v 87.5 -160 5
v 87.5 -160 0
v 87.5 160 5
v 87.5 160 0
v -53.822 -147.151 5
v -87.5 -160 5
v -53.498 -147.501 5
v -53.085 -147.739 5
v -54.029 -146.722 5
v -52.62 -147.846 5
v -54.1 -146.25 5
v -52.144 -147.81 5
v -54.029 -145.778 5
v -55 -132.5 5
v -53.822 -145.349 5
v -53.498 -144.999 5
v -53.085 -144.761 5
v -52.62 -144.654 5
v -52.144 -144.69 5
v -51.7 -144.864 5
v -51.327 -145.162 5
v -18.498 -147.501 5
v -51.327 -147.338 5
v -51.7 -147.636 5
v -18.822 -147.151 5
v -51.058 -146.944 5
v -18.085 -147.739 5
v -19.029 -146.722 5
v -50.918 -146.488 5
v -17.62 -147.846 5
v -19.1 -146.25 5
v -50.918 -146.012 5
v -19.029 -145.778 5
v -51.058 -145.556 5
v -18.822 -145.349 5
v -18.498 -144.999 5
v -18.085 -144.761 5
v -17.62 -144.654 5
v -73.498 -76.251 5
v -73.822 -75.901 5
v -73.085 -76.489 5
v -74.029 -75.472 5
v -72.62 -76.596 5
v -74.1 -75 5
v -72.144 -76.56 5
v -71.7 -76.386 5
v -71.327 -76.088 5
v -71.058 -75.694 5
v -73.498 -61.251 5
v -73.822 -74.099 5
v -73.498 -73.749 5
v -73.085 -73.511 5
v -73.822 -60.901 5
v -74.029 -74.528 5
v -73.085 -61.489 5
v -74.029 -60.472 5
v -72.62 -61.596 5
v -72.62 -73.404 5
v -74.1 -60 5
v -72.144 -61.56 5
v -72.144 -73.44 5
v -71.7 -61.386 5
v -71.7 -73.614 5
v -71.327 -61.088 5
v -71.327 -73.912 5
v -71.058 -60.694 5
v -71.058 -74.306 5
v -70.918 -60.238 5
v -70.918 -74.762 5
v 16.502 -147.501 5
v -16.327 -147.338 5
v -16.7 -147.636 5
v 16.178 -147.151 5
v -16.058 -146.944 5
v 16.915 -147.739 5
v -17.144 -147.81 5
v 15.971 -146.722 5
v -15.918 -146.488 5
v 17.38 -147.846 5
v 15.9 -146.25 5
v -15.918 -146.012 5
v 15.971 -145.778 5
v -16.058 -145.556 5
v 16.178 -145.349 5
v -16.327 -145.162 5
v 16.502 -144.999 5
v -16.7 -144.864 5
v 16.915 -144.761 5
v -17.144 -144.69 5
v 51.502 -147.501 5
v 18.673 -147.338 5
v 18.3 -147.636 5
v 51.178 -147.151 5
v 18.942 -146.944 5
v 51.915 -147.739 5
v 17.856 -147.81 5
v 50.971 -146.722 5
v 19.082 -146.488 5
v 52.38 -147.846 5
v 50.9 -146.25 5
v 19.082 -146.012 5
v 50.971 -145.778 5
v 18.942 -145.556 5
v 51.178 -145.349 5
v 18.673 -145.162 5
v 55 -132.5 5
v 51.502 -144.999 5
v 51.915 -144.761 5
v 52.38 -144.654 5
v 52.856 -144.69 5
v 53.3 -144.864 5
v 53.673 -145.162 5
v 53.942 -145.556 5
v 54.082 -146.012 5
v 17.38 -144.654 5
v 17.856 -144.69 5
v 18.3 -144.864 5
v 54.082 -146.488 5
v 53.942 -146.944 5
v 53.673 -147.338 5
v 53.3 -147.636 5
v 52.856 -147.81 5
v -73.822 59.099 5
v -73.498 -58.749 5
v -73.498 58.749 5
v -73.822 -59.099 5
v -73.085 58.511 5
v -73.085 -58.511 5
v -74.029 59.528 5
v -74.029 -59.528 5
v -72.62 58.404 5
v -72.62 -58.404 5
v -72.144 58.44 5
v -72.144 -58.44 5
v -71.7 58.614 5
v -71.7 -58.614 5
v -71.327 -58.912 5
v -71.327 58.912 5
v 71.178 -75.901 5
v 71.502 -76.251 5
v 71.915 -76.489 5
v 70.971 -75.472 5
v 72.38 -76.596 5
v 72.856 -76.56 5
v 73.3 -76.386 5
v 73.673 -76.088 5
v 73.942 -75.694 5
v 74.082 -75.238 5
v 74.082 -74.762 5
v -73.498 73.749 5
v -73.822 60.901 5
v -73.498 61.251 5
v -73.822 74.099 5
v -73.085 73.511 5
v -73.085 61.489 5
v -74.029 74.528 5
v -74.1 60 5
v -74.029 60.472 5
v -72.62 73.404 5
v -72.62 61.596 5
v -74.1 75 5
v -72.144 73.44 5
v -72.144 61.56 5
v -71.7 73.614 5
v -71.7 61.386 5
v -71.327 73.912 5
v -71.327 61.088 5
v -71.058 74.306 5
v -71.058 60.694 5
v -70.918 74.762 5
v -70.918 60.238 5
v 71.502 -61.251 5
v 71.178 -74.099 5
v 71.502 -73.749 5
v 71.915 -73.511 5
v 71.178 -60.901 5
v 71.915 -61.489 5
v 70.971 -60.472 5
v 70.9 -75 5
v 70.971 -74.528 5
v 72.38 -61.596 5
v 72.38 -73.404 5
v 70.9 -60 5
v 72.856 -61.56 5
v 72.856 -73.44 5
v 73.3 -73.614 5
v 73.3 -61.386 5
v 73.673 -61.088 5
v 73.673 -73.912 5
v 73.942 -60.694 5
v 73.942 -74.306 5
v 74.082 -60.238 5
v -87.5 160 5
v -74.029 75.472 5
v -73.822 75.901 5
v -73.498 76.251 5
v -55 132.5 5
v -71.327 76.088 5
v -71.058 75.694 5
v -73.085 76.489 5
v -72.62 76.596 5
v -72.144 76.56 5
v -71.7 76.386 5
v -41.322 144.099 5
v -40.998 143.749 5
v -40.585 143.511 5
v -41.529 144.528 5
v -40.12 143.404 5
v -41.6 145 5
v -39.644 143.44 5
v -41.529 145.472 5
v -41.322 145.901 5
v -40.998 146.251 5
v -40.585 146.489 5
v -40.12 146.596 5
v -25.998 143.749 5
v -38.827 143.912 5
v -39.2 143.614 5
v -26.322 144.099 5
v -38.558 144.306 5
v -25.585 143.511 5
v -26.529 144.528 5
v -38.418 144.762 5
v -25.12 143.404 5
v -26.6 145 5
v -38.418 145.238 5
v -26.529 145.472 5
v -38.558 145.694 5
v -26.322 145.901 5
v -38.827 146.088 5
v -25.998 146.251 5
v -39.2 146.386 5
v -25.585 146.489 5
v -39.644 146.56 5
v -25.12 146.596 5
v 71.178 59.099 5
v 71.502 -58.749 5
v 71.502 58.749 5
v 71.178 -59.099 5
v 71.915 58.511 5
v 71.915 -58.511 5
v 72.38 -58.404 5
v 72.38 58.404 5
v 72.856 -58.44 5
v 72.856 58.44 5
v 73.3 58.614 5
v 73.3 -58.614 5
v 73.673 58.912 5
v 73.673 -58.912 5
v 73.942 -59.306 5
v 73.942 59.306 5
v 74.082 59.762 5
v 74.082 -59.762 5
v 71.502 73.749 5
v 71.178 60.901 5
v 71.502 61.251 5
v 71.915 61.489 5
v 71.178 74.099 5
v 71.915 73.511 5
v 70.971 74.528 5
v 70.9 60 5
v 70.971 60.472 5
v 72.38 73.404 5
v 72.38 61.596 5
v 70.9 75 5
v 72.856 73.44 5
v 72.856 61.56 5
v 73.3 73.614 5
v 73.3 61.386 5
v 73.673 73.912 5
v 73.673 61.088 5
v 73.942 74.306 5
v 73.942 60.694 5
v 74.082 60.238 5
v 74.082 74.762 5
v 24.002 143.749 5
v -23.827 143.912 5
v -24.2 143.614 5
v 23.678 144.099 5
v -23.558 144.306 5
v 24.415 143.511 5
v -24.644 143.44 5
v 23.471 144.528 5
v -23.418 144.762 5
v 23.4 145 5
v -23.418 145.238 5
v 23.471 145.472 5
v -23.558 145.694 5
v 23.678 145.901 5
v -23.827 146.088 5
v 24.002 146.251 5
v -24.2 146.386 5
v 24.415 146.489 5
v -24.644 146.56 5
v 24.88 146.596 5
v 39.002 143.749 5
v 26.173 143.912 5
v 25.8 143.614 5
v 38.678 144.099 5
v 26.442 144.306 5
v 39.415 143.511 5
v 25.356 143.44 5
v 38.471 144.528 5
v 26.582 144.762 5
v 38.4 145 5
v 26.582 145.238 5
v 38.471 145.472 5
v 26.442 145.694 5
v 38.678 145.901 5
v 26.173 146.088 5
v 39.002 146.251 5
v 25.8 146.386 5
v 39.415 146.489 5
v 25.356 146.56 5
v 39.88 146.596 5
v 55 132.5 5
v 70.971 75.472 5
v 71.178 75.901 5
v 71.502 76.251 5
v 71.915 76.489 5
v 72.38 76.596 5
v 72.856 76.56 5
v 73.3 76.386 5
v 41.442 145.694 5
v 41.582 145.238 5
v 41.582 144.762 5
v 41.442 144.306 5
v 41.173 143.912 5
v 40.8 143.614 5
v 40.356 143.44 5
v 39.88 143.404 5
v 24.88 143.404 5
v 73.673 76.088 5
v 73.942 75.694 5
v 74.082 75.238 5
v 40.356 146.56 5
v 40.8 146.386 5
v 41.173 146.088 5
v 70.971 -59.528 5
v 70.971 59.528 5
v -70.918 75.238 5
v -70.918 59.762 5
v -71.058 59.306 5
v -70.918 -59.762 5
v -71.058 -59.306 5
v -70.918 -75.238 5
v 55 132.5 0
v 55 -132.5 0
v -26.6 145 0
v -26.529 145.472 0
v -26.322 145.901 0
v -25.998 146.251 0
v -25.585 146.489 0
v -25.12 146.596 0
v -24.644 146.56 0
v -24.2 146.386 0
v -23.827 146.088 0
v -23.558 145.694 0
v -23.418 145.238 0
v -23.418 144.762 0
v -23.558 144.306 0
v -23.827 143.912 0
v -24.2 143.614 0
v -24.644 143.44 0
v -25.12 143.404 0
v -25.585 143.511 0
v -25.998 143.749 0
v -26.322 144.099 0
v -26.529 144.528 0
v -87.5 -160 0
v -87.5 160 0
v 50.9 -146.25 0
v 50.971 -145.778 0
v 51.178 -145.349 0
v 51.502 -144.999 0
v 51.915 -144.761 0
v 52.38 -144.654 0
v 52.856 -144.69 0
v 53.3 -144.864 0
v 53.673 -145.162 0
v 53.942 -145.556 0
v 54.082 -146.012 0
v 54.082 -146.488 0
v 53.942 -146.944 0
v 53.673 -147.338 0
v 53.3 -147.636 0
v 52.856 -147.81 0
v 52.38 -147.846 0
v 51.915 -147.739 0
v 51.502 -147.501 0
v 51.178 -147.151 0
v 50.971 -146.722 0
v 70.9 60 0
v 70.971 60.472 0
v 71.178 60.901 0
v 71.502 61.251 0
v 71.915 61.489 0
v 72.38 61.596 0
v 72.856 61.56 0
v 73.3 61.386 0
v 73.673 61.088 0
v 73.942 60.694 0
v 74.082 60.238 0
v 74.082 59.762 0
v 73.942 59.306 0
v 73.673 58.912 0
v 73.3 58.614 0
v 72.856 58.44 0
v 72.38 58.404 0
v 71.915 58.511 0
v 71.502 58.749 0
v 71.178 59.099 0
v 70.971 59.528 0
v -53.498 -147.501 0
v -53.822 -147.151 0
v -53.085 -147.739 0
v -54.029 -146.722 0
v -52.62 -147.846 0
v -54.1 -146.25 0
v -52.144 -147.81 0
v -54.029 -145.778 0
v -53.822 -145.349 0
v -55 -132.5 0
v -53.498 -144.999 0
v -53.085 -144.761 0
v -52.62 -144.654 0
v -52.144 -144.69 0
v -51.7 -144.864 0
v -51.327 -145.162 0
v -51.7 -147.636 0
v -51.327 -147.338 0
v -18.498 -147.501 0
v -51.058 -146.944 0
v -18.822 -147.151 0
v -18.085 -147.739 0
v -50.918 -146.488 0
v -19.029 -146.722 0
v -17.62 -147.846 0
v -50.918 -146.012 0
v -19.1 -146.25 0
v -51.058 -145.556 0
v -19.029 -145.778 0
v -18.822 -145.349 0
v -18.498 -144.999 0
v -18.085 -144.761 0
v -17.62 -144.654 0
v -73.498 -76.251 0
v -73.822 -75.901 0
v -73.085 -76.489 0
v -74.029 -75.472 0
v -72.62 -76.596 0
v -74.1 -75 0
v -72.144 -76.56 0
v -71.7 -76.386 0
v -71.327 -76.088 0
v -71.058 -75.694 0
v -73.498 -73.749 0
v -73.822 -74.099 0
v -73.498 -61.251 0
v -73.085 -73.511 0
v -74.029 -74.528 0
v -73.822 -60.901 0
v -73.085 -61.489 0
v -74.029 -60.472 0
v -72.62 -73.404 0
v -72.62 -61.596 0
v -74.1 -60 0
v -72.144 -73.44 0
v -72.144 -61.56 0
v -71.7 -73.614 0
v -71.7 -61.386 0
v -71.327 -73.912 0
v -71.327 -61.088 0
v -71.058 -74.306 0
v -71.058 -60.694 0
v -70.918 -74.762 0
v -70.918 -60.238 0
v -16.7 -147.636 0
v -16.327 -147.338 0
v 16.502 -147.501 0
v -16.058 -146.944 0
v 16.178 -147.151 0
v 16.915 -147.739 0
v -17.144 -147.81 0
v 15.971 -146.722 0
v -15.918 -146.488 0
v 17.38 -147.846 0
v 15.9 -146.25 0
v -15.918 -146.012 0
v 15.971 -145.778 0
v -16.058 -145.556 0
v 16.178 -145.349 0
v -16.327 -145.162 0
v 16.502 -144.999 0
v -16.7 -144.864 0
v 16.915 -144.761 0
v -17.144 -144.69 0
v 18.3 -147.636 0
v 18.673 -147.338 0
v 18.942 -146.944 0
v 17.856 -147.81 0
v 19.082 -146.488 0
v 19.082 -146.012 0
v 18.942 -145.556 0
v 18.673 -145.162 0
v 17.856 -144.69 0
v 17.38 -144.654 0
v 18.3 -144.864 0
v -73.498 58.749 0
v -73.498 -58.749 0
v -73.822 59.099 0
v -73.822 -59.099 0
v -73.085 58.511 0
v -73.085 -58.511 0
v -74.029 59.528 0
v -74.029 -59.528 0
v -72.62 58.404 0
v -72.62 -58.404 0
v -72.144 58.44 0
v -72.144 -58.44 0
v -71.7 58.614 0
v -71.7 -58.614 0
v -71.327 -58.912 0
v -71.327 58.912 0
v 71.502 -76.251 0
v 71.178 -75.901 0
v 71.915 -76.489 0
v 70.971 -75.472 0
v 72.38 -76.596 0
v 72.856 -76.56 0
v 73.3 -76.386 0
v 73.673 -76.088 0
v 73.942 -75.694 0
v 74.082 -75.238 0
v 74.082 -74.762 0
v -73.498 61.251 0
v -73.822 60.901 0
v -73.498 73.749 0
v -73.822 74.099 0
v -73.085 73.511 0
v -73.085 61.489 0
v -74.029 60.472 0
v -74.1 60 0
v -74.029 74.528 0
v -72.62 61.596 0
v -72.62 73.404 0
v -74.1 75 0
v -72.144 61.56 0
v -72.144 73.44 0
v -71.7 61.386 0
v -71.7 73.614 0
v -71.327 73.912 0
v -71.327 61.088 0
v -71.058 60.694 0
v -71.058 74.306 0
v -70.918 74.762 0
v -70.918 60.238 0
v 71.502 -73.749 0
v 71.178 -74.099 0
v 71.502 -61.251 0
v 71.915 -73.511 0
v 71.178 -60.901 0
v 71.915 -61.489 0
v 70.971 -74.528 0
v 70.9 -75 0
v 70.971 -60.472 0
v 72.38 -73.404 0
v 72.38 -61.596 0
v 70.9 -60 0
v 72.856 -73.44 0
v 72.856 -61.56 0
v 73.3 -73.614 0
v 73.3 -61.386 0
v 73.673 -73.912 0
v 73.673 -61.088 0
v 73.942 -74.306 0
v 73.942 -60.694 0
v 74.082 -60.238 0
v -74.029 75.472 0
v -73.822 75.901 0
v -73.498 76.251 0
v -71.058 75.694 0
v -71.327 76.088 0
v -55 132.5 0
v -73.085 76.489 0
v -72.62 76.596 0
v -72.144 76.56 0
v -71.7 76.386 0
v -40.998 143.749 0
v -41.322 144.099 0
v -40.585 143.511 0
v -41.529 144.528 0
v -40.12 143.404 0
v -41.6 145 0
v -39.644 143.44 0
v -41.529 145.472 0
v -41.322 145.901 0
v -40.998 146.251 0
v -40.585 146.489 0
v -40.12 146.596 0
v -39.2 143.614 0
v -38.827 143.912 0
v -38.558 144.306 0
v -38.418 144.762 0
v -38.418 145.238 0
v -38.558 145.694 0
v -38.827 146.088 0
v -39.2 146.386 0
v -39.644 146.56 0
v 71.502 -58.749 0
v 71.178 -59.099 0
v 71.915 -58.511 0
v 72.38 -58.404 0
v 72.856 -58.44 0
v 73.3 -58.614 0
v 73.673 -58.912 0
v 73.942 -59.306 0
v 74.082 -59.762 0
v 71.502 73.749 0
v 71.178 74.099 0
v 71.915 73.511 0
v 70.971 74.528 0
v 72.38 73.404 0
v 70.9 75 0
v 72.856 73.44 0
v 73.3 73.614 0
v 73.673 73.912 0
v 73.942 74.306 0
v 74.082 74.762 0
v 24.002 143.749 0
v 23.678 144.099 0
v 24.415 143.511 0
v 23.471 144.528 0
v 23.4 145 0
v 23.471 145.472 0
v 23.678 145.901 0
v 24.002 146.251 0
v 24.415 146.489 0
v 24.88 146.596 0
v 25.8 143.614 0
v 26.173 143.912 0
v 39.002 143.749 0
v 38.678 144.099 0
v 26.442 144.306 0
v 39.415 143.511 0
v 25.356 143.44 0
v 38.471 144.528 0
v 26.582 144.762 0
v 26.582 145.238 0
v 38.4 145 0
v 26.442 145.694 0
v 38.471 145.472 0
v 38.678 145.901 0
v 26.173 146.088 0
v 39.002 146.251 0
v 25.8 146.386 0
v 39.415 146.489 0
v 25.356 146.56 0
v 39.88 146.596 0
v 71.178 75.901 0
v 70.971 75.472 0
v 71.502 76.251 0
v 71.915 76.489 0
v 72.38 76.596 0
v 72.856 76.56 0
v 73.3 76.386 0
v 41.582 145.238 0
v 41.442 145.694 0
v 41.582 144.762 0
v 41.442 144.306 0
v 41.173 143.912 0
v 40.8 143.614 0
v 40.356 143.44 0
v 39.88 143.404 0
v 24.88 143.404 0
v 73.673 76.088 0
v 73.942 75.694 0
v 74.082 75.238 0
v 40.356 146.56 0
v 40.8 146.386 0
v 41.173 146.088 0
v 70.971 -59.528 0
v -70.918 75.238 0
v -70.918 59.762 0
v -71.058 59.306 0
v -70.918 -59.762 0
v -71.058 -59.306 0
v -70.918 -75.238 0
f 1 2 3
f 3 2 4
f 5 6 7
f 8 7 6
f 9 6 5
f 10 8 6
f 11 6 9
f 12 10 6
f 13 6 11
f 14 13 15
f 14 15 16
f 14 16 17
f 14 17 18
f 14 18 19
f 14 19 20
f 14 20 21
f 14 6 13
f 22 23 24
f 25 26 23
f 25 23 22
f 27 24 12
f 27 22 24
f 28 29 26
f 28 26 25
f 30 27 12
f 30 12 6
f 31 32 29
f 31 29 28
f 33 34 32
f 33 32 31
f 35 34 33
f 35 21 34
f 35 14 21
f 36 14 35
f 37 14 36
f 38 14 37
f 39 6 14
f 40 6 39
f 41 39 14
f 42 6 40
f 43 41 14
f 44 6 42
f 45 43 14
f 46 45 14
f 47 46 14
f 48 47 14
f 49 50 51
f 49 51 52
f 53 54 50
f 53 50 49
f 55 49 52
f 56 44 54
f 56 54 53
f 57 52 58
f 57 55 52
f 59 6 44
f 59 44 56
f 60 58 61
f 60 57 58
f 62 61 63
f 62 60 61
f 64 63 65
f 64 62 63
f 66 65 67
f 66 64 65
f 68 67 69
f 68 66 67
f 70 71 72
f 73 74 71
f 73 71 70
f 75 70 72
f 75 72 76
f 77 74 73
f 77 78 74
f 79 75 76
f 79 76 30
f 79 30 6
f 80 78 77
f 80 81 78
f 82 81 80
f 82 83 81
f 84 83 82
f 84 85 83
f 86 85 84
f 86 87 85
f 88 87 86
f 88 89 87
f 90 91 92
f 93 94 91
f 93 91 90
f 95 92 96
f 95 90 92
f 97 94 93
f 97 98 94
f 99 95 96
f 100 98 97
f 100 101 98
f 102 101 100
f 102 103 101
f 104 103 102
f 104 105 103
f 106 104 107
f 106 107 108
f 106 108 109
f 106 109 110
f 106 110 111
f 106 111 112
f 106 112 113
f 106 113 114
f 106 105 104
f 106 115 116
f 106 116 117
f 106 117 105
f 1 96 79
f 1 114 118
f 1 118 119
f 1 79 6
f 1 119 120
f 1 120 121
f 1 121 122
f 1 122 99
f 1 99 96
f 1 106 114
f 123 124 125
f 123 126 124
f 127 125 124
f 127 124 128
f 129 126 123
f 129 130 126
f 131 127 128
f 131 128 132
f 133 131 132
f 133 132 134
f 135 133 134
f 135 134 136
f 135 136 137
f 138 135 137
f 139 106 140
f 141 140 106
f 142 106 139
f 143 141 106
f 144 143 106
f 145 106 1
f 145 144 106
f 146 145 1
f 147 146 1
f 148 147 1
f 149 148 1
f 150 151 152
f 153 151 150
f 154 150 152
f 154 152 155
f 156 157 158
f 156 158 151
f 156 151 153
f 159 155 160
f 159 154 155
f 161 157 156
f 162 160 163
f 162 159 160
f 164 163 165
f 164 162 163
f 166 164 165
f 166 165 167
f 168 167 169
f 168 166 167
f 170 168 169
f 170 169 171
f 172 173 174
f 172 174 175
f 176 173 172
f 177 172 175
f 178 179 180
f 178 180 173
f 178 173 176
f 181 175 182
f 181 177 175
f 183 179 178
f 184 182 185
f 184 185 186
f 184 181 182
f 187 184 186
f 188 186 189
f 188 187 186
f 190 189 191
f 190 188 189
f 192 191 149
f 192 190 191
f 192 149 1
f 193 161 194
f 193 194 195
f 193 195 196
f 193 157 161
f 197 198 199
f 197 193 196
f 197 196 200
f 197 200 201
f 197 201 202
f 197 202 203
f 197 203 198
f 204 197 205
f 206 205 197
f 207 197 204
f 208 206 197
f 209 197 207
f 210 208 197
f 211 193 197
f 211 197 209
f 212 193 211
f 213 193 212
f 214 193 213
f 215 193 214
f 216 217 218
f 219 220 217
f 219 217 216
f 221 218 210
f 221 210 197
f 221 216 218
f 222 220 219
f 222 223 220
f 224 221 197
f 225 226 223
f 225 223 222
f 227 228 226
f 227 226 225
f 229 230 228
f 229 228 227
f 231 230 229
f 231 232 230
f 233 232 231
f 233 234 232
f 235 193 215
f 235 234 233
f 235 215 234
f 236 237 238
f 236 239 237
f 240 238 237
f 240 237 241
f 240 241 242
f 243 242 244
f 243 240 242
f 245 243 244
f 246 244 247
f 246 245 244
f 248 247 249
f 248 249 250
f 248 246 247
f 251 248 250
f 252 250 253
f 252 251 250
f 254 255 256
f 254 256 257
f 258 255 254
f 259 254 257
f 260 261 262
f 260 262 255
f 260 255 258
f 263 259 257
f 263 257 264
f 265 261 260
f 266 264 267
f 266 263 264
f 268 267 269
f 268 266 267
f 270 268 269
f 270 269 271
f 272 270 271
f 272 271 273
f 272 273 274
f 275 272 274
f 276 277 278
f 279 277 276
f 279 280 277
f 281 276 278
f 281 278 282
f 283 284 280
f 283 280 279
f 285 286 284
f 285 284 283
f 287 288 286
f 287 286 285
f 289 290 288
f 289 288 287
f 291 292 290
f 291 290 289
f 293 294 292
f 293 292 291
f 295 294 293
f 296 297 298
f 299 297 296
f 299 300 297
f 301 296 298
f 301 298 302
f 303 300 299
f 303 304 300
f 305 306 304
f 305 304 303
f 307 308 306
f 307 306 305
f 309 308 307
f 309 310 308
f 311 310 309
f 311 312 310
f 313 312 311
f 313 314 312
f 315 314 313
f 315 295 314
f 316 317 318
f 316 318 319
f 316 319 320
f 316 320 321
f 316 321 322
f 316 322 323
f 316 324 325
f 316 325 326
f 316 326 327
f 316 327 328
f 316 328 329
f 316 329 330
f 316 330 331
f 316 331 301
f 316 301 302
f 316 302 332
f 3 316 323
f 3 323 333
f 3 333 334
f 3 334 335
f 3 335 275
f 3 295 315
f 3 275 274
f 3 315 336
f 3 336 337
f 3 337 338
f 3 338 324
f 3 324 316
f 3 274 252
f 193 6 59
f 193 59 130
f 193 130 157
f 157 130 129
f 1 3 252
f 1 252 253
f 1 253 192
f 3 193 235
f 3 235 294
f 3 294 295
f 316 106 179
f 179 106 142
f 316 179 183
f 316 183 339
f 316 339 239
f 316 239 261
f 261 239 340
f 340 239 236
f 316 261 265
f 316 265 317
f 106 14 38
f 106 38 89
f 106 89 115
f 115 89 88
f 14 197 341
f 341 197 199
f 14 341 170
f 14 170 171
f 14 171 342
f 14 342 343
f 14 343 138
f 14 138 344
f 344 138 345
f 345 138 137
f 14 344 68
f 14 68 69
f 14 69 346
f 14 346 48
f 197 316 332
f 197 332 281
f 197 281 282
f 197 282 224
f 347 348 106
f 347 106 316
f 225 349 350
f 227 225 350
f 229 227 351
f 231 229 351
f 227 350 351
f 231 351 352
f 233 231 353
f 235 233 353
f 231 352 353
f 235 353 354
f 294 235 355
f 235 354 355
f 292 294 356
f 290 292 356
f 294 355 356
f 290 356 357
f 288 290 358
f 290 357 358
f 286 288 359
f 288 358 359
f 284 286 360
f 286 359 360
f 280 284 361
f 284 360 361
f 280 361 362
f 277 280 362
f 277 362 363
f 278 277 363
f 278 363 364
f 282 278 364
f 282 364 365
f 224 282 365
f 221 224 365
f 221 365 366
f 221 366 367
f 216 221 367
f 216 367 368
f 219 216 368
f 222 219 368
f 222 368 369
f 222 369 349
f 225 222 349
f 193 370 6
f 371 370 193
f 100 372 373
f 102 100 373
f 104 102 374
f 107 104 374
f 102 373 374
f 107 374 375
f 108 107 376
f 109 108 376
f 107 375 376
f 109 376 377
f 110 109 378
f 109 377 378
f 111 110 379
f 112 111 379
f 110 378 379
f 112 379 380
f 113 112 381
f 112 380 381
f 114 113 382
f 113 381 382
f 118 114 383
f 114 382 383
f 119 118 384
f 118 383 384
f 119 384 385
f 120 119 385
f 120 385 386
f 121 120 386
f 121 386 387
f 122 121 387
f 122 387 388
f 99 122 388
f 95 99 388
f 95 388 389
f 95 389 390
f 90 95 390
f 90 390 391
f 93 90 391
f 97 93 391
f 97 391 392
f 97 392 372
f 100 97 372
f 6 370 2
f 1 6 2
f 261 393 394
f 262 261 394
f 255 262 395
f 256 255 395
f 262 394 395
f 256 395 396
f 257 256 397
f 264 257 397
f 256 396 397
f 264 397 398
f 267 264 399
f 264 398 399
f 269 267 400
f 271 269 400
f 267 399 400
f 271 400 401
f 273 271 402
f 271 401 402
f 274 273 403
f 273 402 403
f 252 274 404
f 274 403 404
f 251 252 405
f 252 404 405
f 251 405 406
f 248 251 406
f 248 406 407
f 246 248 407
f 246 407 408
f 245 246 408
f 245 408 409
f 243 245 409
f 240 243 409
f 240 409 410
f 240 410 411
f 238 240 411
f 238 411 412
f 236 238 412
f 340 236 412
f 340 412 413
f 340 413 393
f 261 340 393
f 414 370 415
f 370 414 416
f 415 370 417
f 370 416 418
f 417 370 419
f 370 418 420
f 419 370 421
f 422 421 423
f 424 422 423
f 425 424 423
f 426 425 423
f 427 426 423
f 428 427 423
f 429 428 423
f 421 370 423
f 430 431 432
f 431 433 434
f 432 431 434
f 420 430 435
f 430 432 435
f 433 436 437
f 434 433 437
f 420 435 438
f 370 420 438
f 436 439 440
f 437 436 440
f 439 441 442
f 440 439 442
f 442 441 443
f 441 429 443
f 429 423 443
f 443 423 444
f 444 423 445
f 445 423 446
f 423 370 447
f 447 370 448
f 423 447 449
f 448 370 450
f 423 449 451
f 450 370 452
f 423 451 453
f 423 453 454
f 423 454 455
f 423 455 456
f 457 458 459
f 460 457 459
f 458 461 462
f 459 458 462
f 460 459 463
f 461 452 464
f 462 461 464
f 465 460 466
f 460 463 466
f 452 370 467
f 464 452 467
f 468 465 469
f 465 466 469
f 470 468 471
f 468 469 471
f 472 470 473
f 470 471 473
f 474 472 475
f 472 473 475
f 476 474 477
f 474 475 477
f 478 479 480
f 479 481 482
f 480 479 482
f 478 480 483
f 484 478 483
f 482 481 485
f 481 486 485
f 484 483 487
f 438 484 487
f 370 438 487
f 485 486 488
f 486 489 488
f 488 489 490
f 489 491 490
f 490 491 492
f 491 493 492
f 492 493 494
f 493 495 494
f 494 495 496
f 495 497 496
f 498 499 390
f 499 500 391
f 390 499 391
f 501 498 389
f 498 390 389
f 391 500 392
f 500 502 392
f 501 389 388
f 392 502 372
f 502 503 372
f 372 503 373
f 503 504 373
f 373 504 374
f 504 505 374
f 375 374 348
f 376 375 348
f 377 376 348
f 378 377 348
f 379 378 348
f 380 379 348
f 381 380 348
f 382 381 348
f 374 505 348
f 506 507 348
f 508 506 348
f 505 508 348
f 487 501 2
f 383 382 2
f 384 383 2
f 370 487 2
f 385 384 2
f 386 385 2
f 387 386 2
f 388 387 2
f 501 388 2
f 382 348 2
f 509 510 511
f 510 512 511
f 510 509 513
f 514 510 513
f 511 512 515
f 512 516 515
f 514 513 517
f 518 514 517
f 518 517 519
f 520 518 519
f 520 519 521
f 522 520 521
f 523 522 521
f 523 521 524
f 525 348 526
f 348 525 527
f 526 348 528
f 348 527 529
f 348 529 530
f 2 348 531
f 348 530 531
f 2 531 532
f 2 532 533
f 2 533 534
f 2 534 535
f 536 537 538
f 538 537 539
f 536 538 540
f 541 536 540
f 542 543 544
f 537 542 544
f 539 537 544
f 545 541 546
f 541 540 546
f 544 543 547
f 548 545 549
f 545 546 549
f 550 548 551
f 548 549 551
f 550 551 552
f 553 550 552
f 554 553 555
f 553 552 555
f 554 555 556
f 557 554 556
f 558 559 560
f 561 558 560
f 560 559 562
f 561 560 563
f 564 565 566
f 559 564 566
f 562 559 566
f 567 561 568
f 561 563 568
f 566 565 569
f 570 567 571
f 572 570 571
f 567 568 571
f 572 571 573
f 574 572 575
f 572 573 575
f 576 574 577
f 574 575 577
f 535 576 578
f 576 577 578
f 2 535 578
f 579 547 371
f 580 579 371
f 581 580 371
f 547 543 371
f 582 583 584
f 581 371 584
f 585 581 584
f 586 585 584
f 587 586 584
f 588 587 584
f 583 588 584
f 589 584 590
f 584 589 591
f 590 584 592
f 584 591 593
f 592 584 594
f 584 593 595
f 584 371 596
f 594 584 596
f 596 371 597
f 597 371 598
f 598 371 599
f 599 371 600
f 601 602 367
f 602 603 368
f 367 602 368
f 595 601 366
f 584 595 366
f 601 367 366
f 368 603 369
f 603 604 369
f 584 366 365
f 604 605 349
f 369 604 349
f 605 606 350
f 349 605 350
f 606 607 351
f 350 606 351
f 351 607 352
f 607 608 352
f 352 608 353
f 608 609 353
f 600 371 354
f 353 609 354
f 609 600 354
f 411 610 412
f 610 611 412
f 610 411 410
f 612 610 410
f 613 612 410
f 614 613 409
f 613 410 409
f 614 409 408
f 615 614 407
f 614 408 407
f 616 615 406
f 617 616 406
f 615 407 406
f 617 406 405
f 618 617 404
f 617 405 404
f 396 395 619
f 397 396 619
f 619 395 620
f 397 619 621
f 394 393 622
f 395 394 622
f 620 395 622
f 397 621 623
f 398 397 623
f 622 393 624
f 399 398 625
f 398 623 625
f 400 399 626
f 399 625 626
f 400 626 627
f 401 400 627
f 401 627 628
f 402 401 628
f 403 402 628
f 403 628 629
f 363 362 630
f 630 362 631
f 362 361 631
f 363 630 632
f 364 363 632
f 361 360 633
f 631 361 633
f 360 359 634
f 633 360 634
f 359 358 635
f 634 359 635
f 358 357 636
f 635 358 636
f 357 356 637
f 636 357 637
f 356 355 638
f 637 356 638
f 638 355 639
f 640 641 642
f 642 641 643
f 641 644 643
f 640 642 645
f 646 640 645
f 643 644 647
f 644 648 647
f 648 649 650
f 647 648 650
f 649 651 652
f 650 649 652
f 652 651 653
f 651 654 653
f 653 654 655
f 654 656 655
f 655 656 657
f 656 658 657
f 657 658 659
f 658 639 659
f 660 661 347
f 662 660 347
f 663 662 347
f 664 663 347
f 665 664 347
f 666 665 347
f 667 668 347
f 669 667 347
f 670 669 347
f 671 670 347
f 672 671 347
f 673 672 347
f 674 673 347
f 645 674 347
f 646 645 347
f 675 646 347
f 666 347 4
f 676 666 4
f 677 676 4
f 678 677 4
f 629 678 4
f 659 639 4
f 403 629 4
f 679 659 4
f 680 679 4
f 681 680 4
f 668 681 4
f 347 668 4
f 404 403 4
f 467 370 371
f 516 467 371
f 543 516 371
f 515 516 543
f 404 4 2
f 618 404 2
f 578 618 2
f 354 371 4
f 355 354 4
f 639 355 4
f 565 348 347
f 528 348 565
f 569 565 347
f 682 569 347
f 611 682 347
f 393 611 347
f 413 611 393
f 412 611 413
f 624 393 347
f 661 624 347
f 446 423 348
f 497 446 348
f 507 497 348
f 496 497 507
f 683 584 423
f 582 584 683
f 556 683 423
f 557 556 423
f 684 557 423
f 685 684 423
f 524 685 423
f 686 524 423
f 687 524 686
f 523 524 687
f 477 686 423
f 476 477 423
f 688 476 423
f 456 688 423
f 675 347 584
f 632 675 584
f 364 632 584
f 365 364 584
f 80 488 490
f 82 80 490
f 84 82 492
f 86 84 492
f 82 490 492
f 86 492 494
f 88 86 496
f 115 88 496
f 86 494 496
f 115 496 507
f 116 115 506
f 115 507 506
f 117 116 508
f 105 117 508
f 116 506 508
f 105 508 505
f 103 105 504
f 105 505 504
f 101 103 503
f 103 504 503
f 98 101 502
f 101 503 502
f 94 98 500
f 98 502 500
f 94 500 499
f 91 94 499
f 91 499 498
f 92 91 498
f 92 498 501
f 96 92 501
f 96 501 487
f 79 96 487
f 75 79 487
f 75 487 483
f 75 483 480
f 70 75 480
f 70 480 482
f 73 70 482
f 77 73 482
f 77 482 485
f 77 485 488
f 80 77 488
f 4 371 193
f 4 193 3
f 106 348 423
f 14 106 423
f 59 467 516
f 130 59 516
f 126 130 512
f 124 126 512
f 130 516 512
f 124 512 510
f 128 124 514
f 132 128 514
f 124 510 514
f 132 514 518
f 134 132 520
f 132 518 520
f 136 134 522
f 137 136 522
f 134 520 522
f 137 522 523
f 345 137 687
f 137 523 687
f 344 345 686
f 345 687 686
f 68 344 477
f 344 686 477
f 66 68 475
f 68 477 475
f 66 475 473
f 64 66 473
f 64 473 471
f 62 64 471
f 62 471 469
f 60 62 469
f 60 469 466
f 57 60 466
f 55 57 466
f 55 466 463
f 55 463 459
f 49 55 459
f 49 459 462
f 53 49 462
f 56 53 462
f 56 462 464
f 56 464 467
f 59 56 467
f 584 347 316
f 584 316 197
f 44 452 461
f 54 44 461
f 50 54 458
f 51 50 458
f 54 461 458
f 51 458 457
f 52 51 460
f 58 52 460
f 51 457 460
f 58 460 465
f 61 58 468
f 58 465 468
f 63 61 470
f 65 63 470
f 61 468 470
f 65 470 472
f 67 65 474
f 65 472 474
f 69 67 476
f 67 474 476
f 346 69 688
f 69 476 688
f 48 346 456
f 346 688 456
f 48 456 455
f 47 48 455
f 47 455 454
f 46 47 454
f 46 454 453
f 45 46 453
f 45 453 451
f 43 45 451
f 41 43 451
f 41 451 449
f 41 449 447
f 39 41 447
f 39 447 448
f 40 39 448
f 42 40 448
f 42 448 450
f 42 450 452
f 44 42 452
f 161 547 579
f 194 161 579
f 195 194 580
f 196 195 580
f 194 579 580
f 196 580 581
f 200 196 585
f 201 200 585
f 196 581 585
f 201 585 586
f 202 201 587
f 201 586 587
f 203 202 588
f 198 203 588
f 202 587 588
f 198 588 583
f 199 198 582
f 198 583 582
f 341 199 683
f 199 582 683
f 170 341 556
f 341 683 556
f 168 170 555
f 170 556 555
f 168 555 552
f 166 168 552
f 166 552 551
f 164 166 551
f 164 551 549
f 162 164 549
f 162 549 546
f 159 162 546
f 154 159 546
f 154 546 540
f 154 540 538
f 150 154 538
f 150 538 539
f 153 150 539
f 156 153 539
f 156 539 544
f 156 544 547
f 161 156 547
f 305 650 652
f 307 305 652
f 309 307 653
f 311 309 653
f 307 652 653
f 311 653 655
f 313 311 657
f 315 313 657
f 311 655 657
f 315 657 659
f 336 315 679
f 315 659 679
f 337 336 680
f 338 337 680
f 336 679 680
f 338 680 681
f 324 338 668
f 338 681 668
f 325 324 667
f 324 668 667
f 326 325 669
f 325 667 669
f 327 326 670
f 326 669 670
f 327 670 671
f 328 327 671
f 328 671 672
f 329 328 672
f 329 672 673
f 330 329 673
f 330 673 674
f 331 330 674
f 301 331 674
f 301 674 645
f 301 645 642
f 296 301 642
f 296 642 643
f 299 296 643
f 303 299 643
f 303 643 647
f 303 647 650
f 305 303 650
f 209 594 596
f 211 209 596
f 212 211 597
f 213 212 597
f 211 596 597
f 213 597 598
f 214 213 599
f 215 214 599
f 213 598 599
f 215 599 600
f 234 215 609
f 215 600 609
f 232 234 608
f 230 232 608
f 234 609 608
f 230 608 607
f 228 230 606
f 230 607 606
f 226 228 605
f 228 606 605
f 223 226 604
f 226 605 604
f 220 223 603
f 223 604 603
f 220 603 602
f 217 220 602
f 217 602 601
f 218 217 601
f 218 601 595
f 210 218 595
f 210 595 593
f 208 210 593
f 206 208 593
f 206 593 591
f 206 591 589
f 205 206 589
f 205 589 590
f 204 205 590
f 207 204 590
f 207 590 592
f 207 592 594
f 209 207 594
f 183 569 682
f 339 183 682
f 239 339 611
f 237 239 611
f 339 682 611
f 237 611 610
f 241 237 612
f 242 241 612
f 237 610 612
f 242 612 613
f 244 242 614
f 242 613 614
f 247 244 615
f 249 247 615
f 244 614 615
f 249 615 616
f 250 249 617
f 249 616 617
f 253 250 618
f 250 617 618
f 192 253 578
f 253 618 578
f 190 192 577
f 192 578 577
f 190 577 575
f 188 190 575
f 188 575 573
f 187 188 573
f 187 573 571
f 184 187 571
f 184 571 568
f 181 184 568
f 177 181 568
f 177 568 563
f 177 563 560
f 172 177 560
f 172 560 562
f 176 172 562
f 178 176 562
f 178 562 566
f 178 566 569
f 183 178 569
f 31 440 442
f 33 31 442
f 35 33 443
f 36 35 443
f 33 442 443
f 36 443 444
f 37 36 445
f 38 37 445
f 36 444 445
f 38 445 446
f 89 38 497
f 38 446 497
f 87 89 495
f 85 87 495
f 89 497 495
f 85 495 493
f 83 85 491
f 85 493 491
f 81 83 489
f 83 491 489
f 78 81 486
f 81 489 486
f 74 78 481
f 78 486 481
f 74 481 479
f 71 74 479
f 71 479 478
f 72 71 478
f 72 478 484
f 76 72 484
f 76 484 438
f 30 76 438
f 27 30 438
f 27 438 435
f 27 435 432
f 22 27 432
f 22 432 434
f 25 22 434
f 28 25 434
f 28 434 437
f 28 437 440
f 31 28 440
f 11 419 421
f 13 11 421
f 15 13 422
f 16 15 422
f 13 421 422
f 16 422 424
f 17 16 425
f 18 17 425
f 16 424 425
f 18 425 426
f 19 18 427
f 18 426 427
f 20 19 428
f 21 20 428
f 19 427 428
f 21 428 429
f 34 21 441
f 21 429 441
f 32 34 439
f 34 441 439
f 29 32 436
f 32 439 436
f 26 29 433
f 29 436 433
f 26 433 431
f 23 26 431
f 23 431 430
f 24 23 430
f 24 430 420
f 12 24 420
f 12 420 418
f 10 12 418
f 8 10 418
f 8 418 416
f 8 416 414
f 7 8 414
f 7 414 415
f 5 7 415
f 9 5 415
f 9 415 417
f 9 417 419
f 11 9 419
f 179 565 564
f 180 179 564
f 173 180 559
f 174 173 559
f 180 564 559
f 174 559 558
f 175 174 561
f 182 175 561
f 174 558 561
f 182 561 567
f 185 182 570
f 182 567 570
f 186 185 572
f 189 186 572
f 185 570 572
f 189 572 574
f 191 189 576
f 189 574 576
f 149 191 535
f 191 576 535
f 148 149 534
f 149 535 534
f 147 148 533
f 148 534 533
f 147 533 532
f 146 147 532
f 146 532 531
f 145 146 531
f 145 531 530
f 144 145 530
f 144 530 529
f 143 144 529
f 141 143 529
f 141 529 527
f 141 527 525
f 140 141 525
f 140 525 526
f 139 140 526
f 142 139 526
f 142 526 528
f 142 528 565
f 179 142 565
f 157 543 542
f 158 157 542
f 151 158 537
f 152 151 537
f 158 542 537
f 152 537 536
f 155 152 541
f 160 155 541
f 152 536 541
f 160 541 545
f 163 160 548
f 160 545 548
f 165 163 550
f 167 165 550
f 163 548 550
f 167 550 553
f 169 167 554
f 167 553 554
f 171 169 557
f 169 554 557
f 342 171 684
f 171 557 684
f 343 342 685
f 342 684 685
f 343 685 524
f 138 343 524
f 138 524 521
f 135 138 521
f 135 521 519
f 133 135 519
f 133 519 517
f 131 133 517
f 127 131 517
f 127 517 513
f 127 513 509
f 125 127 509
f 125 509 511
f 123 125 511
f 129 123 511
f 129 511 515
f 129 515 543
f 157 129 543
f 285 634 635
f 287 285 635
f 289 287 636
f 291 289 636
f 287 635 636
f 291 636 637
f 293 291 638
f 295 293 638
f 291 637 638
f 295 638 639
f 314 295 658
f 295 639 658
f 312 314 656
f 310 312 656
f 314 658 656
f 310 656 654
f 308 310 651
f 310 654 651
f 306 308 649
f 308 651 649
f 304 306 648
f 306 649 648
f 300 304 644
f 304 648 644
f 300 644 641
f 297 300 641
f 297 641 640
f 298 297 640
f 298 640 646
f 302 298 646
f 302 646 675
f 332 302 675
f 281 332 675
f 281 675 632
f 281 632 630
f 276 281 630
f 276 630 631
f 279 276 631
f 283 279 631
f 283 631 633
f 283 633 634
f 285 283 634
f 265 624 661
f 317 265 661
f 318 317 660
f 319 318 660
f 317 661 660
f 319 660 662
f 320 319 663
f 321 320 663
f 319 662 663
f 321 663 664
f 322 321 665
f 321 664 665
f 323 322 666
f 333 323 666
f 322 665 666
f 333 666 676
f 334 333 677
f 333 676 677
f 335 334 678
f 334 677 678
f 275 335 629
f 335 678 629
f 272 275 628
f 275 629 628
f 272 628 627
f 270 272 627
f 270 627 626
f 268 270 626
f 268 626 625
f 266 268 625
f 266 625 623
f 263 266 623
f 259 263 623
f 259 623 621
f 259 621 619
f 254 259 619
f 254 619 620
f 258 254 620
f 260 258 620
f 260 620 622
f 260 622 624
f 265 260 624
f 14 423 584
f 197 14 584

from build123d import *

# Parameters (mm, degrees)
SKETCH1_W                      = 175
SKETCH1_H                      = 320
BOSS_EXTRUDE1_DEPTH            = 5
CUT_EXTRUDE1_REACH             = 7
SKETCH2_W                      = 110
SKETCH2_H                      = 265
CUT_EXTRUDE2_REACH             = 7
SKETCH4_R                      = 1.6
CUT_EXTRUDE3_REACH             = 7
SKETCH5_R                      = 1.6
CUT_EXTRUDE4_REACH             = 7
SKETCH6_R                      = 1.6
CUT_EXTRUDE4_DIRECTION_2_DEPTH = 1


with BuildPart() as part:
    # Sketch1 → Boss-Extrude1 (new body)
    with BuildSketch(Plane.XY):
        Rectangle(SKETCH1_W, SKETCH1_H)
    extrude(amount=BOSS_EXTRUDE1_DEPTH)

    # Sketch2 → Cut-Extrude1 (cut, up to next)
    with BuildSketch(Plane(origin=(0, 0, 0), x_dir=(-1, 0, 0), z_dir=(0, 0, -1)), mode=Mode.PRIVATE) as cut_extrude1_sk1:
        Rectangle(SKETCH2_W, SKETCH2_H)
    cut_extrude1_tool1 = extrude(cut_extrude1_sk1.sketch, amount=-CUT_EXTRUDE1_REACH, mode=Mode.PRIVATE) & part.part
    add(cut_extrude1_tool1.solids().sort_by_distance((0, 0, 0))[0], mode=Mode.SUBTRACT)

    # Sketch4 → Cut-Extrude2 (cut, up to next)
    with BuildSketch(Plane(origin=(0, 0, 0), x_dir=(-1, 0, 0), z_dir=(0, 0, -1)), mode=Mode.PRIVATE) as cut_extrude2_sk1:
        with Locations((-25, 145)):
            Circle(SKETCH4_R)
    cut_extrude2_tool1 = extrude(cut_extrude2_sk1.sketch, amount=-CUT_EXTRUDE2_REACH, mode=Mode.PRIVATE) & part.part
    add(cut_extrude2_tool1.solids().sort_by_distance((25, 145, 0))[0], mode=Mode.SUBTRACT)
    # Sketch4 → Cut-Extrude2 (cut, up to next)
    with BuildSketch(Plane(origin=(0, 0, 0), x_dir=(-1, 0, 0), z_dir=(0, 0, -1)), mode=Mode.PRIVATE) as cut_extrude2_sk2:
        with Locations((-40, 145)):
            Circle(SKETCH4_R)
    cut_extrude2_tool2 = extrude(cut_extrude2_sk2.sketch, amount=-CUT_EXTRUDE2_REACH, mode=Mode.PRIVATE) & part.part
    add(cut_extrude2_tool2.solids().sort_by_distance((40, 145, 0))[0], mode=Mode.SUBTRACT)
    # Sketch4 → Cut-Extrude2 (cut, up to next)
    with BuildSketch(Plane(origin=(0, 0, 0), x_dir=(-1, 0, 0), z_dir=(0, 0, -1)), mode=Mode.PRIVATE) as cut_extrude2_sk3:
        with Locations((25, 145)):
            Circle(SKETCH4_R)
    cut_extrude2_tool3 = extrude(cut_extrude2_sk3.sketch, amount=-CUT_EXTRUDE2_REACH, mode=Mode.PRIVATE) & part.part
    add(cut_extrude2_tool3.solids().sort_by_distance((-25, 145, 0))[0], mode=Mode.SUBTRACT)
    # Sketch4 → Cut-Extrude2 (cut, up to next)
    with BuildSketch(Plane(origin=(0, 0, 0), x_dir=(-1, 0, 0), z_dir=(0, 0, -1)), mode=Mode.PRIVATE) as cut_extrude2_sk4:
        with Locations((40, 145)):
            Circle(SKETCH4_R)
    cut_extrude2_tool4 = extrude(cut_extrude2_sk4.sketch, amount=-CUT_EXTRUDE2_REACH, mode=Mode.PRIVATE) & part.part
    add(cut_extrude2_tool4.solids().sort_by_distance((-40, 145, 0))[0], mode=Mode.SUBTRACT)

    # Sketch5 → Cut-Extrude3 (cut, up to next)
    with BuildSketch(Plane(origin=(0, 0, 0), x_dir=(-1, 0, 0), z_dir=(0, 0, -1)), mode=Mode.PRIVATE) as cut_extrude3_sk1:
        with Locations((-72.5, 75)):
            Circle(SKETCH5_R)
    cut_extrude3_tool1 = extrude(cut_extrude3_sk1.sketch, amount=-CUT_EXTRUDE3_REACH, mode=Mode.PRIVATE) & part.part
    add(cut_extrude3_tool1.solids().sort_by_distance((72.5, 75, 0))[0], mode=Mode.SUBTRACT)
    # Sketch5 → Cut-Extrude3 (cut, up to next)
    with BuildSketch(Plane(origin=(0, 0, 0), x_dir=(-1, 0, 0), z_dir=(0, 0, -1)), mode=Mode.PRIVATE) as cut_extrude3_sk2:
        with Locations((-72.5, 60)):
            Circle(SKETCH5_R)
    cut_extrude3_tool2 = extrude(cut_extrude3_sk2.sketch, amount=-CUT_EXTRUDE3_REACH, mode=Mode.PRIVATE) & part.part
    add(cut_extrude3_tool2.solids().sort_by_distance((72.5, 60, 0))[0], mode=Mode.SUBTRACT)
    # Sketch5 → Cut-Extrude3 (cut, up to next)
    with BuildSketch(Plane(origin=(0, 0, 0), x_dir=(-1, 0, 0), z_dir=(0, 0, -1)), mode=Mode.PRIVATE) as cut_extrude3_sk3:
        with Locations((-72.5, -75)):
            Circle(SKETCH5_R)
    cut_extrude3_tool3 = extrude(cut_extrude3_sk3.sketch, amount=-CUT_EXTRUDE3_REACH, mode=Mode.PRIVATE) & part.part
    add(cut_extrude3_tool3.solids().sort_by_distance((72.5, -75, 0))[0], mode=Mode.SUBTRACT)
    # Sketch5 → Cut-Extrude3 (cut, up to next)
    with BuildSketch(Plane(origin=(0, 0, 0), x_dir=(-1, 0, 0), z_dir=(0, 0, -1)), mode=Mode.PRIVATE) as cut_extrude3_sk4:
        with Locations((-72.5, -60)):
            Circle(SKETCH5_R)
    cut_extrude3_tool4 = extrude(cut_extrude3_sk4.sketch, amount=-CUT_EXTRUDE3_REACH, mode=Mode.PRIVATE) & part.part
    add(cut_extrude3_tool4.solids().sort_by_distance((72.5, -60, 0))[0], mode=Mode.SUBTRACT)
    # Sketch5 → Cut-Extrude3 (cut, up to next)
    with BuildSketch(Plane(origin=(0, 0, 0), x_dir=(-1, 0, 0), z_dir=(0, 0, -1)), mode=Mode.PRIVATE) as cut_extrude3_sk5:
        with Locations((72.5, -75)):
            Circle(SKETCH5_R)
    cut_extrude3_tool5 = extrude(cut_extrude3_sk5.sketch, amount=-CUT_EXTRUDE3_REACH, mode=Mode.PRIVATE) & part.part
    add(cut_extrude3_tool5.solids().sort_by_distance((-72.5, -75, 0))[0], mode=Mode.SUBTRACT)
    # Sketch5 → Cut-Extrude3 (cut, up to next)
    with BuildSketch(Plane(origin=(0, 0, 0), x_dir=(-1, 0, 0), z_dir=(0, 0, -1)), mode=Mode.PRIVATE) as cut_extrude3_sk6:
        with Locations((72.5, -60)):
            Circle(SKETCH5_R)
    cut_extrude3_tool6 = extrude(cut_extrude3_sk6.sketch, amount=-CUT_EXTRUDE3_REACH, mode=Mode.PRIVATE) & part.part
    add(cut_extrude3_tool6.solids().sort_by_distance((-72.5, -60, 0))[0], mode=Mode.SUBTRACT)
    # Sketch5 → Cut-Extrude3 (cut, up to next)
    with BuildSketch(Plane(origin=(0, 0, 0), x_dir=(-1, 0, 0), z_dir=(0, 0, -1)), mode=Mode.PRIVATE) as cut_extrude3_sk7:
        with Locations((72.5, 60)):
            Circle(SKETCH5_R)
    cut_extrude3_tool7 = extrude(cut_extrude3_sk7.sketch, amount=-CUT_EXTRUDE3_REACH, mode=Mode.PRIVATE) & part.part
    add(cut_extrude3_tool7.solids().sort_by_distance((-72.5, 60, 0))[0], mode=Mode.SUBTRACT)
    # Sketch5 → Cut-Extrude3 (cut, up to next)
    with BuildSketch(Plane(origin=(0, 0, 0), x_dir=(-1, 0, 0), z_dir=(0, 0, -1)), mode=Mode.PRIVATE) as cut_extrude3_sk8:
        with Locations((72.5, 75)):
            Circle(SKETCH5_R)
    cut_extrude3_tool8 = extrude(cut_extrude3_sk8.sketch, amount=-CUT_EXTRUDE3_REACH, mode=Mode.PRIVATE) & part.part
    add(cut_extrude3_tool8.solids().sort_by_distance((-72.5, 75, 0))[0], mode=Mode.SUBTRACT)

    # Sketch6 → Cut-Extrude4 (cut, up to next)
    with BuildSketch(Plane(origin=(0, 0, 0), x_dir=(-1, 0, 0), z_dir=(0, 0, -1)), mode=Mode.PRIVATE) as cut_extrude4_sk1:
        with Locations((52.5, -146.25)):
            Circle(SKETCH6_R)
    cut_extrude4_tool1 = extrude(cut_extrude4_sk1.sketch, amount=-CUT_EXTRUDE4_REACH, mode=Mode.PRIVATE) & part.part
    add(cut_extrude4_tool1.solids().sort_by_distance((-52.5, -146.25, 0))[0], mode=Mode.SUBTRACT)
    # Sketch6 → Cut-Extrude4 (cut, up to next)
    with BuildSketch(Plane(origin=(0, 0, 0), x_dir=(-1, 0, 0), z_dir=(0, 0, -1)), mode=Mode.PRIVATE) as cut_extrude4_sk2:
        with Locations((17.5, -146.25)):
            Circle(SKETCH6_R)
    cut_extrude4_tool2 = extrude(cut_extrude4_sk2.sketch, amount=-CUT_EXTRUDE4_REACH, mode=Mode.PRIVATE) & part.part
    add(cut_extrude4_tool2.solids().sort_by_distance((-17.5, -146.25, 0))[0], mode=Mode.SUBTRACT)
    # Sketch6 → Cut-Extrude4 (cut, up to next)
    with BuildSketch(Plane(origin=(0, 0, 0), x_dir=(-1, 0, 0), z_dir=(0, 0, -1)), mode=Mode.PRIVATE) as cut_extrude4_sk3:
        with Locations((-17.5, -146.25)):
            Circle(SKETCH6_R)
    cut_extrude4_tool3 = extrude(cut_extrude4_sk3.sketch, amount=-CUT_EXTRUDE4_REACH, mode=Mode.PRIVATE) & part.part
    add(cut_extrude4_tool3.solids().sort_by_distance((17.5, -146.25, 0))[0], mode=Mode.SUBTRACT)
    # Sketch6 → Cut-Extrude4 (cut, up to next)
    with BuildSketch(Plane(origin=(0, 0, 0), x_dir=(-1, 0, 0), z_dir=(0, 0, -1)), mode=Mode.PRIVATE) as cut_extrude4_sk4:
        with Locations((-52.5, -146.25)):
            Circle(SKETCH6_R)
    cut_extrude4_tool4 = extrude(cut_extrude4_sk4.sketch, amount=-CUT_EXTRUDE4_REACH, mode=Mode.PRIVATE) & part.part
    add(cut_extrude4_tool4.solids().sort_by_distance((52.5, -146.25, 0))[0], mode=Mode.SUBTRACT)

    # Sketch6 → Cut-Extrude4 direction 2 (cut)
    with BuildSketch(Plane(origin=(0, 0, 0), x_dir=(-1, 0, 0), z_dir=(0, 0, -1))):
        with Locations((52.5, -146.25)):
            Circle(SKETCH6_R)
        with Locations((17.5, -146.25)):
            Circle(SKETCH6_R)
        with Locations((-17.5, -146.25)):
            Circle(SKETCH6_R)
        with Locations((-52.5, -146.25)):
            Circle(SKETCH6_R)
    extrude(amount=CUT_EXTRUDE4_DIRECTION_2_DEPTH, mode=Mode.SUBTRACT)


solid = part.part
